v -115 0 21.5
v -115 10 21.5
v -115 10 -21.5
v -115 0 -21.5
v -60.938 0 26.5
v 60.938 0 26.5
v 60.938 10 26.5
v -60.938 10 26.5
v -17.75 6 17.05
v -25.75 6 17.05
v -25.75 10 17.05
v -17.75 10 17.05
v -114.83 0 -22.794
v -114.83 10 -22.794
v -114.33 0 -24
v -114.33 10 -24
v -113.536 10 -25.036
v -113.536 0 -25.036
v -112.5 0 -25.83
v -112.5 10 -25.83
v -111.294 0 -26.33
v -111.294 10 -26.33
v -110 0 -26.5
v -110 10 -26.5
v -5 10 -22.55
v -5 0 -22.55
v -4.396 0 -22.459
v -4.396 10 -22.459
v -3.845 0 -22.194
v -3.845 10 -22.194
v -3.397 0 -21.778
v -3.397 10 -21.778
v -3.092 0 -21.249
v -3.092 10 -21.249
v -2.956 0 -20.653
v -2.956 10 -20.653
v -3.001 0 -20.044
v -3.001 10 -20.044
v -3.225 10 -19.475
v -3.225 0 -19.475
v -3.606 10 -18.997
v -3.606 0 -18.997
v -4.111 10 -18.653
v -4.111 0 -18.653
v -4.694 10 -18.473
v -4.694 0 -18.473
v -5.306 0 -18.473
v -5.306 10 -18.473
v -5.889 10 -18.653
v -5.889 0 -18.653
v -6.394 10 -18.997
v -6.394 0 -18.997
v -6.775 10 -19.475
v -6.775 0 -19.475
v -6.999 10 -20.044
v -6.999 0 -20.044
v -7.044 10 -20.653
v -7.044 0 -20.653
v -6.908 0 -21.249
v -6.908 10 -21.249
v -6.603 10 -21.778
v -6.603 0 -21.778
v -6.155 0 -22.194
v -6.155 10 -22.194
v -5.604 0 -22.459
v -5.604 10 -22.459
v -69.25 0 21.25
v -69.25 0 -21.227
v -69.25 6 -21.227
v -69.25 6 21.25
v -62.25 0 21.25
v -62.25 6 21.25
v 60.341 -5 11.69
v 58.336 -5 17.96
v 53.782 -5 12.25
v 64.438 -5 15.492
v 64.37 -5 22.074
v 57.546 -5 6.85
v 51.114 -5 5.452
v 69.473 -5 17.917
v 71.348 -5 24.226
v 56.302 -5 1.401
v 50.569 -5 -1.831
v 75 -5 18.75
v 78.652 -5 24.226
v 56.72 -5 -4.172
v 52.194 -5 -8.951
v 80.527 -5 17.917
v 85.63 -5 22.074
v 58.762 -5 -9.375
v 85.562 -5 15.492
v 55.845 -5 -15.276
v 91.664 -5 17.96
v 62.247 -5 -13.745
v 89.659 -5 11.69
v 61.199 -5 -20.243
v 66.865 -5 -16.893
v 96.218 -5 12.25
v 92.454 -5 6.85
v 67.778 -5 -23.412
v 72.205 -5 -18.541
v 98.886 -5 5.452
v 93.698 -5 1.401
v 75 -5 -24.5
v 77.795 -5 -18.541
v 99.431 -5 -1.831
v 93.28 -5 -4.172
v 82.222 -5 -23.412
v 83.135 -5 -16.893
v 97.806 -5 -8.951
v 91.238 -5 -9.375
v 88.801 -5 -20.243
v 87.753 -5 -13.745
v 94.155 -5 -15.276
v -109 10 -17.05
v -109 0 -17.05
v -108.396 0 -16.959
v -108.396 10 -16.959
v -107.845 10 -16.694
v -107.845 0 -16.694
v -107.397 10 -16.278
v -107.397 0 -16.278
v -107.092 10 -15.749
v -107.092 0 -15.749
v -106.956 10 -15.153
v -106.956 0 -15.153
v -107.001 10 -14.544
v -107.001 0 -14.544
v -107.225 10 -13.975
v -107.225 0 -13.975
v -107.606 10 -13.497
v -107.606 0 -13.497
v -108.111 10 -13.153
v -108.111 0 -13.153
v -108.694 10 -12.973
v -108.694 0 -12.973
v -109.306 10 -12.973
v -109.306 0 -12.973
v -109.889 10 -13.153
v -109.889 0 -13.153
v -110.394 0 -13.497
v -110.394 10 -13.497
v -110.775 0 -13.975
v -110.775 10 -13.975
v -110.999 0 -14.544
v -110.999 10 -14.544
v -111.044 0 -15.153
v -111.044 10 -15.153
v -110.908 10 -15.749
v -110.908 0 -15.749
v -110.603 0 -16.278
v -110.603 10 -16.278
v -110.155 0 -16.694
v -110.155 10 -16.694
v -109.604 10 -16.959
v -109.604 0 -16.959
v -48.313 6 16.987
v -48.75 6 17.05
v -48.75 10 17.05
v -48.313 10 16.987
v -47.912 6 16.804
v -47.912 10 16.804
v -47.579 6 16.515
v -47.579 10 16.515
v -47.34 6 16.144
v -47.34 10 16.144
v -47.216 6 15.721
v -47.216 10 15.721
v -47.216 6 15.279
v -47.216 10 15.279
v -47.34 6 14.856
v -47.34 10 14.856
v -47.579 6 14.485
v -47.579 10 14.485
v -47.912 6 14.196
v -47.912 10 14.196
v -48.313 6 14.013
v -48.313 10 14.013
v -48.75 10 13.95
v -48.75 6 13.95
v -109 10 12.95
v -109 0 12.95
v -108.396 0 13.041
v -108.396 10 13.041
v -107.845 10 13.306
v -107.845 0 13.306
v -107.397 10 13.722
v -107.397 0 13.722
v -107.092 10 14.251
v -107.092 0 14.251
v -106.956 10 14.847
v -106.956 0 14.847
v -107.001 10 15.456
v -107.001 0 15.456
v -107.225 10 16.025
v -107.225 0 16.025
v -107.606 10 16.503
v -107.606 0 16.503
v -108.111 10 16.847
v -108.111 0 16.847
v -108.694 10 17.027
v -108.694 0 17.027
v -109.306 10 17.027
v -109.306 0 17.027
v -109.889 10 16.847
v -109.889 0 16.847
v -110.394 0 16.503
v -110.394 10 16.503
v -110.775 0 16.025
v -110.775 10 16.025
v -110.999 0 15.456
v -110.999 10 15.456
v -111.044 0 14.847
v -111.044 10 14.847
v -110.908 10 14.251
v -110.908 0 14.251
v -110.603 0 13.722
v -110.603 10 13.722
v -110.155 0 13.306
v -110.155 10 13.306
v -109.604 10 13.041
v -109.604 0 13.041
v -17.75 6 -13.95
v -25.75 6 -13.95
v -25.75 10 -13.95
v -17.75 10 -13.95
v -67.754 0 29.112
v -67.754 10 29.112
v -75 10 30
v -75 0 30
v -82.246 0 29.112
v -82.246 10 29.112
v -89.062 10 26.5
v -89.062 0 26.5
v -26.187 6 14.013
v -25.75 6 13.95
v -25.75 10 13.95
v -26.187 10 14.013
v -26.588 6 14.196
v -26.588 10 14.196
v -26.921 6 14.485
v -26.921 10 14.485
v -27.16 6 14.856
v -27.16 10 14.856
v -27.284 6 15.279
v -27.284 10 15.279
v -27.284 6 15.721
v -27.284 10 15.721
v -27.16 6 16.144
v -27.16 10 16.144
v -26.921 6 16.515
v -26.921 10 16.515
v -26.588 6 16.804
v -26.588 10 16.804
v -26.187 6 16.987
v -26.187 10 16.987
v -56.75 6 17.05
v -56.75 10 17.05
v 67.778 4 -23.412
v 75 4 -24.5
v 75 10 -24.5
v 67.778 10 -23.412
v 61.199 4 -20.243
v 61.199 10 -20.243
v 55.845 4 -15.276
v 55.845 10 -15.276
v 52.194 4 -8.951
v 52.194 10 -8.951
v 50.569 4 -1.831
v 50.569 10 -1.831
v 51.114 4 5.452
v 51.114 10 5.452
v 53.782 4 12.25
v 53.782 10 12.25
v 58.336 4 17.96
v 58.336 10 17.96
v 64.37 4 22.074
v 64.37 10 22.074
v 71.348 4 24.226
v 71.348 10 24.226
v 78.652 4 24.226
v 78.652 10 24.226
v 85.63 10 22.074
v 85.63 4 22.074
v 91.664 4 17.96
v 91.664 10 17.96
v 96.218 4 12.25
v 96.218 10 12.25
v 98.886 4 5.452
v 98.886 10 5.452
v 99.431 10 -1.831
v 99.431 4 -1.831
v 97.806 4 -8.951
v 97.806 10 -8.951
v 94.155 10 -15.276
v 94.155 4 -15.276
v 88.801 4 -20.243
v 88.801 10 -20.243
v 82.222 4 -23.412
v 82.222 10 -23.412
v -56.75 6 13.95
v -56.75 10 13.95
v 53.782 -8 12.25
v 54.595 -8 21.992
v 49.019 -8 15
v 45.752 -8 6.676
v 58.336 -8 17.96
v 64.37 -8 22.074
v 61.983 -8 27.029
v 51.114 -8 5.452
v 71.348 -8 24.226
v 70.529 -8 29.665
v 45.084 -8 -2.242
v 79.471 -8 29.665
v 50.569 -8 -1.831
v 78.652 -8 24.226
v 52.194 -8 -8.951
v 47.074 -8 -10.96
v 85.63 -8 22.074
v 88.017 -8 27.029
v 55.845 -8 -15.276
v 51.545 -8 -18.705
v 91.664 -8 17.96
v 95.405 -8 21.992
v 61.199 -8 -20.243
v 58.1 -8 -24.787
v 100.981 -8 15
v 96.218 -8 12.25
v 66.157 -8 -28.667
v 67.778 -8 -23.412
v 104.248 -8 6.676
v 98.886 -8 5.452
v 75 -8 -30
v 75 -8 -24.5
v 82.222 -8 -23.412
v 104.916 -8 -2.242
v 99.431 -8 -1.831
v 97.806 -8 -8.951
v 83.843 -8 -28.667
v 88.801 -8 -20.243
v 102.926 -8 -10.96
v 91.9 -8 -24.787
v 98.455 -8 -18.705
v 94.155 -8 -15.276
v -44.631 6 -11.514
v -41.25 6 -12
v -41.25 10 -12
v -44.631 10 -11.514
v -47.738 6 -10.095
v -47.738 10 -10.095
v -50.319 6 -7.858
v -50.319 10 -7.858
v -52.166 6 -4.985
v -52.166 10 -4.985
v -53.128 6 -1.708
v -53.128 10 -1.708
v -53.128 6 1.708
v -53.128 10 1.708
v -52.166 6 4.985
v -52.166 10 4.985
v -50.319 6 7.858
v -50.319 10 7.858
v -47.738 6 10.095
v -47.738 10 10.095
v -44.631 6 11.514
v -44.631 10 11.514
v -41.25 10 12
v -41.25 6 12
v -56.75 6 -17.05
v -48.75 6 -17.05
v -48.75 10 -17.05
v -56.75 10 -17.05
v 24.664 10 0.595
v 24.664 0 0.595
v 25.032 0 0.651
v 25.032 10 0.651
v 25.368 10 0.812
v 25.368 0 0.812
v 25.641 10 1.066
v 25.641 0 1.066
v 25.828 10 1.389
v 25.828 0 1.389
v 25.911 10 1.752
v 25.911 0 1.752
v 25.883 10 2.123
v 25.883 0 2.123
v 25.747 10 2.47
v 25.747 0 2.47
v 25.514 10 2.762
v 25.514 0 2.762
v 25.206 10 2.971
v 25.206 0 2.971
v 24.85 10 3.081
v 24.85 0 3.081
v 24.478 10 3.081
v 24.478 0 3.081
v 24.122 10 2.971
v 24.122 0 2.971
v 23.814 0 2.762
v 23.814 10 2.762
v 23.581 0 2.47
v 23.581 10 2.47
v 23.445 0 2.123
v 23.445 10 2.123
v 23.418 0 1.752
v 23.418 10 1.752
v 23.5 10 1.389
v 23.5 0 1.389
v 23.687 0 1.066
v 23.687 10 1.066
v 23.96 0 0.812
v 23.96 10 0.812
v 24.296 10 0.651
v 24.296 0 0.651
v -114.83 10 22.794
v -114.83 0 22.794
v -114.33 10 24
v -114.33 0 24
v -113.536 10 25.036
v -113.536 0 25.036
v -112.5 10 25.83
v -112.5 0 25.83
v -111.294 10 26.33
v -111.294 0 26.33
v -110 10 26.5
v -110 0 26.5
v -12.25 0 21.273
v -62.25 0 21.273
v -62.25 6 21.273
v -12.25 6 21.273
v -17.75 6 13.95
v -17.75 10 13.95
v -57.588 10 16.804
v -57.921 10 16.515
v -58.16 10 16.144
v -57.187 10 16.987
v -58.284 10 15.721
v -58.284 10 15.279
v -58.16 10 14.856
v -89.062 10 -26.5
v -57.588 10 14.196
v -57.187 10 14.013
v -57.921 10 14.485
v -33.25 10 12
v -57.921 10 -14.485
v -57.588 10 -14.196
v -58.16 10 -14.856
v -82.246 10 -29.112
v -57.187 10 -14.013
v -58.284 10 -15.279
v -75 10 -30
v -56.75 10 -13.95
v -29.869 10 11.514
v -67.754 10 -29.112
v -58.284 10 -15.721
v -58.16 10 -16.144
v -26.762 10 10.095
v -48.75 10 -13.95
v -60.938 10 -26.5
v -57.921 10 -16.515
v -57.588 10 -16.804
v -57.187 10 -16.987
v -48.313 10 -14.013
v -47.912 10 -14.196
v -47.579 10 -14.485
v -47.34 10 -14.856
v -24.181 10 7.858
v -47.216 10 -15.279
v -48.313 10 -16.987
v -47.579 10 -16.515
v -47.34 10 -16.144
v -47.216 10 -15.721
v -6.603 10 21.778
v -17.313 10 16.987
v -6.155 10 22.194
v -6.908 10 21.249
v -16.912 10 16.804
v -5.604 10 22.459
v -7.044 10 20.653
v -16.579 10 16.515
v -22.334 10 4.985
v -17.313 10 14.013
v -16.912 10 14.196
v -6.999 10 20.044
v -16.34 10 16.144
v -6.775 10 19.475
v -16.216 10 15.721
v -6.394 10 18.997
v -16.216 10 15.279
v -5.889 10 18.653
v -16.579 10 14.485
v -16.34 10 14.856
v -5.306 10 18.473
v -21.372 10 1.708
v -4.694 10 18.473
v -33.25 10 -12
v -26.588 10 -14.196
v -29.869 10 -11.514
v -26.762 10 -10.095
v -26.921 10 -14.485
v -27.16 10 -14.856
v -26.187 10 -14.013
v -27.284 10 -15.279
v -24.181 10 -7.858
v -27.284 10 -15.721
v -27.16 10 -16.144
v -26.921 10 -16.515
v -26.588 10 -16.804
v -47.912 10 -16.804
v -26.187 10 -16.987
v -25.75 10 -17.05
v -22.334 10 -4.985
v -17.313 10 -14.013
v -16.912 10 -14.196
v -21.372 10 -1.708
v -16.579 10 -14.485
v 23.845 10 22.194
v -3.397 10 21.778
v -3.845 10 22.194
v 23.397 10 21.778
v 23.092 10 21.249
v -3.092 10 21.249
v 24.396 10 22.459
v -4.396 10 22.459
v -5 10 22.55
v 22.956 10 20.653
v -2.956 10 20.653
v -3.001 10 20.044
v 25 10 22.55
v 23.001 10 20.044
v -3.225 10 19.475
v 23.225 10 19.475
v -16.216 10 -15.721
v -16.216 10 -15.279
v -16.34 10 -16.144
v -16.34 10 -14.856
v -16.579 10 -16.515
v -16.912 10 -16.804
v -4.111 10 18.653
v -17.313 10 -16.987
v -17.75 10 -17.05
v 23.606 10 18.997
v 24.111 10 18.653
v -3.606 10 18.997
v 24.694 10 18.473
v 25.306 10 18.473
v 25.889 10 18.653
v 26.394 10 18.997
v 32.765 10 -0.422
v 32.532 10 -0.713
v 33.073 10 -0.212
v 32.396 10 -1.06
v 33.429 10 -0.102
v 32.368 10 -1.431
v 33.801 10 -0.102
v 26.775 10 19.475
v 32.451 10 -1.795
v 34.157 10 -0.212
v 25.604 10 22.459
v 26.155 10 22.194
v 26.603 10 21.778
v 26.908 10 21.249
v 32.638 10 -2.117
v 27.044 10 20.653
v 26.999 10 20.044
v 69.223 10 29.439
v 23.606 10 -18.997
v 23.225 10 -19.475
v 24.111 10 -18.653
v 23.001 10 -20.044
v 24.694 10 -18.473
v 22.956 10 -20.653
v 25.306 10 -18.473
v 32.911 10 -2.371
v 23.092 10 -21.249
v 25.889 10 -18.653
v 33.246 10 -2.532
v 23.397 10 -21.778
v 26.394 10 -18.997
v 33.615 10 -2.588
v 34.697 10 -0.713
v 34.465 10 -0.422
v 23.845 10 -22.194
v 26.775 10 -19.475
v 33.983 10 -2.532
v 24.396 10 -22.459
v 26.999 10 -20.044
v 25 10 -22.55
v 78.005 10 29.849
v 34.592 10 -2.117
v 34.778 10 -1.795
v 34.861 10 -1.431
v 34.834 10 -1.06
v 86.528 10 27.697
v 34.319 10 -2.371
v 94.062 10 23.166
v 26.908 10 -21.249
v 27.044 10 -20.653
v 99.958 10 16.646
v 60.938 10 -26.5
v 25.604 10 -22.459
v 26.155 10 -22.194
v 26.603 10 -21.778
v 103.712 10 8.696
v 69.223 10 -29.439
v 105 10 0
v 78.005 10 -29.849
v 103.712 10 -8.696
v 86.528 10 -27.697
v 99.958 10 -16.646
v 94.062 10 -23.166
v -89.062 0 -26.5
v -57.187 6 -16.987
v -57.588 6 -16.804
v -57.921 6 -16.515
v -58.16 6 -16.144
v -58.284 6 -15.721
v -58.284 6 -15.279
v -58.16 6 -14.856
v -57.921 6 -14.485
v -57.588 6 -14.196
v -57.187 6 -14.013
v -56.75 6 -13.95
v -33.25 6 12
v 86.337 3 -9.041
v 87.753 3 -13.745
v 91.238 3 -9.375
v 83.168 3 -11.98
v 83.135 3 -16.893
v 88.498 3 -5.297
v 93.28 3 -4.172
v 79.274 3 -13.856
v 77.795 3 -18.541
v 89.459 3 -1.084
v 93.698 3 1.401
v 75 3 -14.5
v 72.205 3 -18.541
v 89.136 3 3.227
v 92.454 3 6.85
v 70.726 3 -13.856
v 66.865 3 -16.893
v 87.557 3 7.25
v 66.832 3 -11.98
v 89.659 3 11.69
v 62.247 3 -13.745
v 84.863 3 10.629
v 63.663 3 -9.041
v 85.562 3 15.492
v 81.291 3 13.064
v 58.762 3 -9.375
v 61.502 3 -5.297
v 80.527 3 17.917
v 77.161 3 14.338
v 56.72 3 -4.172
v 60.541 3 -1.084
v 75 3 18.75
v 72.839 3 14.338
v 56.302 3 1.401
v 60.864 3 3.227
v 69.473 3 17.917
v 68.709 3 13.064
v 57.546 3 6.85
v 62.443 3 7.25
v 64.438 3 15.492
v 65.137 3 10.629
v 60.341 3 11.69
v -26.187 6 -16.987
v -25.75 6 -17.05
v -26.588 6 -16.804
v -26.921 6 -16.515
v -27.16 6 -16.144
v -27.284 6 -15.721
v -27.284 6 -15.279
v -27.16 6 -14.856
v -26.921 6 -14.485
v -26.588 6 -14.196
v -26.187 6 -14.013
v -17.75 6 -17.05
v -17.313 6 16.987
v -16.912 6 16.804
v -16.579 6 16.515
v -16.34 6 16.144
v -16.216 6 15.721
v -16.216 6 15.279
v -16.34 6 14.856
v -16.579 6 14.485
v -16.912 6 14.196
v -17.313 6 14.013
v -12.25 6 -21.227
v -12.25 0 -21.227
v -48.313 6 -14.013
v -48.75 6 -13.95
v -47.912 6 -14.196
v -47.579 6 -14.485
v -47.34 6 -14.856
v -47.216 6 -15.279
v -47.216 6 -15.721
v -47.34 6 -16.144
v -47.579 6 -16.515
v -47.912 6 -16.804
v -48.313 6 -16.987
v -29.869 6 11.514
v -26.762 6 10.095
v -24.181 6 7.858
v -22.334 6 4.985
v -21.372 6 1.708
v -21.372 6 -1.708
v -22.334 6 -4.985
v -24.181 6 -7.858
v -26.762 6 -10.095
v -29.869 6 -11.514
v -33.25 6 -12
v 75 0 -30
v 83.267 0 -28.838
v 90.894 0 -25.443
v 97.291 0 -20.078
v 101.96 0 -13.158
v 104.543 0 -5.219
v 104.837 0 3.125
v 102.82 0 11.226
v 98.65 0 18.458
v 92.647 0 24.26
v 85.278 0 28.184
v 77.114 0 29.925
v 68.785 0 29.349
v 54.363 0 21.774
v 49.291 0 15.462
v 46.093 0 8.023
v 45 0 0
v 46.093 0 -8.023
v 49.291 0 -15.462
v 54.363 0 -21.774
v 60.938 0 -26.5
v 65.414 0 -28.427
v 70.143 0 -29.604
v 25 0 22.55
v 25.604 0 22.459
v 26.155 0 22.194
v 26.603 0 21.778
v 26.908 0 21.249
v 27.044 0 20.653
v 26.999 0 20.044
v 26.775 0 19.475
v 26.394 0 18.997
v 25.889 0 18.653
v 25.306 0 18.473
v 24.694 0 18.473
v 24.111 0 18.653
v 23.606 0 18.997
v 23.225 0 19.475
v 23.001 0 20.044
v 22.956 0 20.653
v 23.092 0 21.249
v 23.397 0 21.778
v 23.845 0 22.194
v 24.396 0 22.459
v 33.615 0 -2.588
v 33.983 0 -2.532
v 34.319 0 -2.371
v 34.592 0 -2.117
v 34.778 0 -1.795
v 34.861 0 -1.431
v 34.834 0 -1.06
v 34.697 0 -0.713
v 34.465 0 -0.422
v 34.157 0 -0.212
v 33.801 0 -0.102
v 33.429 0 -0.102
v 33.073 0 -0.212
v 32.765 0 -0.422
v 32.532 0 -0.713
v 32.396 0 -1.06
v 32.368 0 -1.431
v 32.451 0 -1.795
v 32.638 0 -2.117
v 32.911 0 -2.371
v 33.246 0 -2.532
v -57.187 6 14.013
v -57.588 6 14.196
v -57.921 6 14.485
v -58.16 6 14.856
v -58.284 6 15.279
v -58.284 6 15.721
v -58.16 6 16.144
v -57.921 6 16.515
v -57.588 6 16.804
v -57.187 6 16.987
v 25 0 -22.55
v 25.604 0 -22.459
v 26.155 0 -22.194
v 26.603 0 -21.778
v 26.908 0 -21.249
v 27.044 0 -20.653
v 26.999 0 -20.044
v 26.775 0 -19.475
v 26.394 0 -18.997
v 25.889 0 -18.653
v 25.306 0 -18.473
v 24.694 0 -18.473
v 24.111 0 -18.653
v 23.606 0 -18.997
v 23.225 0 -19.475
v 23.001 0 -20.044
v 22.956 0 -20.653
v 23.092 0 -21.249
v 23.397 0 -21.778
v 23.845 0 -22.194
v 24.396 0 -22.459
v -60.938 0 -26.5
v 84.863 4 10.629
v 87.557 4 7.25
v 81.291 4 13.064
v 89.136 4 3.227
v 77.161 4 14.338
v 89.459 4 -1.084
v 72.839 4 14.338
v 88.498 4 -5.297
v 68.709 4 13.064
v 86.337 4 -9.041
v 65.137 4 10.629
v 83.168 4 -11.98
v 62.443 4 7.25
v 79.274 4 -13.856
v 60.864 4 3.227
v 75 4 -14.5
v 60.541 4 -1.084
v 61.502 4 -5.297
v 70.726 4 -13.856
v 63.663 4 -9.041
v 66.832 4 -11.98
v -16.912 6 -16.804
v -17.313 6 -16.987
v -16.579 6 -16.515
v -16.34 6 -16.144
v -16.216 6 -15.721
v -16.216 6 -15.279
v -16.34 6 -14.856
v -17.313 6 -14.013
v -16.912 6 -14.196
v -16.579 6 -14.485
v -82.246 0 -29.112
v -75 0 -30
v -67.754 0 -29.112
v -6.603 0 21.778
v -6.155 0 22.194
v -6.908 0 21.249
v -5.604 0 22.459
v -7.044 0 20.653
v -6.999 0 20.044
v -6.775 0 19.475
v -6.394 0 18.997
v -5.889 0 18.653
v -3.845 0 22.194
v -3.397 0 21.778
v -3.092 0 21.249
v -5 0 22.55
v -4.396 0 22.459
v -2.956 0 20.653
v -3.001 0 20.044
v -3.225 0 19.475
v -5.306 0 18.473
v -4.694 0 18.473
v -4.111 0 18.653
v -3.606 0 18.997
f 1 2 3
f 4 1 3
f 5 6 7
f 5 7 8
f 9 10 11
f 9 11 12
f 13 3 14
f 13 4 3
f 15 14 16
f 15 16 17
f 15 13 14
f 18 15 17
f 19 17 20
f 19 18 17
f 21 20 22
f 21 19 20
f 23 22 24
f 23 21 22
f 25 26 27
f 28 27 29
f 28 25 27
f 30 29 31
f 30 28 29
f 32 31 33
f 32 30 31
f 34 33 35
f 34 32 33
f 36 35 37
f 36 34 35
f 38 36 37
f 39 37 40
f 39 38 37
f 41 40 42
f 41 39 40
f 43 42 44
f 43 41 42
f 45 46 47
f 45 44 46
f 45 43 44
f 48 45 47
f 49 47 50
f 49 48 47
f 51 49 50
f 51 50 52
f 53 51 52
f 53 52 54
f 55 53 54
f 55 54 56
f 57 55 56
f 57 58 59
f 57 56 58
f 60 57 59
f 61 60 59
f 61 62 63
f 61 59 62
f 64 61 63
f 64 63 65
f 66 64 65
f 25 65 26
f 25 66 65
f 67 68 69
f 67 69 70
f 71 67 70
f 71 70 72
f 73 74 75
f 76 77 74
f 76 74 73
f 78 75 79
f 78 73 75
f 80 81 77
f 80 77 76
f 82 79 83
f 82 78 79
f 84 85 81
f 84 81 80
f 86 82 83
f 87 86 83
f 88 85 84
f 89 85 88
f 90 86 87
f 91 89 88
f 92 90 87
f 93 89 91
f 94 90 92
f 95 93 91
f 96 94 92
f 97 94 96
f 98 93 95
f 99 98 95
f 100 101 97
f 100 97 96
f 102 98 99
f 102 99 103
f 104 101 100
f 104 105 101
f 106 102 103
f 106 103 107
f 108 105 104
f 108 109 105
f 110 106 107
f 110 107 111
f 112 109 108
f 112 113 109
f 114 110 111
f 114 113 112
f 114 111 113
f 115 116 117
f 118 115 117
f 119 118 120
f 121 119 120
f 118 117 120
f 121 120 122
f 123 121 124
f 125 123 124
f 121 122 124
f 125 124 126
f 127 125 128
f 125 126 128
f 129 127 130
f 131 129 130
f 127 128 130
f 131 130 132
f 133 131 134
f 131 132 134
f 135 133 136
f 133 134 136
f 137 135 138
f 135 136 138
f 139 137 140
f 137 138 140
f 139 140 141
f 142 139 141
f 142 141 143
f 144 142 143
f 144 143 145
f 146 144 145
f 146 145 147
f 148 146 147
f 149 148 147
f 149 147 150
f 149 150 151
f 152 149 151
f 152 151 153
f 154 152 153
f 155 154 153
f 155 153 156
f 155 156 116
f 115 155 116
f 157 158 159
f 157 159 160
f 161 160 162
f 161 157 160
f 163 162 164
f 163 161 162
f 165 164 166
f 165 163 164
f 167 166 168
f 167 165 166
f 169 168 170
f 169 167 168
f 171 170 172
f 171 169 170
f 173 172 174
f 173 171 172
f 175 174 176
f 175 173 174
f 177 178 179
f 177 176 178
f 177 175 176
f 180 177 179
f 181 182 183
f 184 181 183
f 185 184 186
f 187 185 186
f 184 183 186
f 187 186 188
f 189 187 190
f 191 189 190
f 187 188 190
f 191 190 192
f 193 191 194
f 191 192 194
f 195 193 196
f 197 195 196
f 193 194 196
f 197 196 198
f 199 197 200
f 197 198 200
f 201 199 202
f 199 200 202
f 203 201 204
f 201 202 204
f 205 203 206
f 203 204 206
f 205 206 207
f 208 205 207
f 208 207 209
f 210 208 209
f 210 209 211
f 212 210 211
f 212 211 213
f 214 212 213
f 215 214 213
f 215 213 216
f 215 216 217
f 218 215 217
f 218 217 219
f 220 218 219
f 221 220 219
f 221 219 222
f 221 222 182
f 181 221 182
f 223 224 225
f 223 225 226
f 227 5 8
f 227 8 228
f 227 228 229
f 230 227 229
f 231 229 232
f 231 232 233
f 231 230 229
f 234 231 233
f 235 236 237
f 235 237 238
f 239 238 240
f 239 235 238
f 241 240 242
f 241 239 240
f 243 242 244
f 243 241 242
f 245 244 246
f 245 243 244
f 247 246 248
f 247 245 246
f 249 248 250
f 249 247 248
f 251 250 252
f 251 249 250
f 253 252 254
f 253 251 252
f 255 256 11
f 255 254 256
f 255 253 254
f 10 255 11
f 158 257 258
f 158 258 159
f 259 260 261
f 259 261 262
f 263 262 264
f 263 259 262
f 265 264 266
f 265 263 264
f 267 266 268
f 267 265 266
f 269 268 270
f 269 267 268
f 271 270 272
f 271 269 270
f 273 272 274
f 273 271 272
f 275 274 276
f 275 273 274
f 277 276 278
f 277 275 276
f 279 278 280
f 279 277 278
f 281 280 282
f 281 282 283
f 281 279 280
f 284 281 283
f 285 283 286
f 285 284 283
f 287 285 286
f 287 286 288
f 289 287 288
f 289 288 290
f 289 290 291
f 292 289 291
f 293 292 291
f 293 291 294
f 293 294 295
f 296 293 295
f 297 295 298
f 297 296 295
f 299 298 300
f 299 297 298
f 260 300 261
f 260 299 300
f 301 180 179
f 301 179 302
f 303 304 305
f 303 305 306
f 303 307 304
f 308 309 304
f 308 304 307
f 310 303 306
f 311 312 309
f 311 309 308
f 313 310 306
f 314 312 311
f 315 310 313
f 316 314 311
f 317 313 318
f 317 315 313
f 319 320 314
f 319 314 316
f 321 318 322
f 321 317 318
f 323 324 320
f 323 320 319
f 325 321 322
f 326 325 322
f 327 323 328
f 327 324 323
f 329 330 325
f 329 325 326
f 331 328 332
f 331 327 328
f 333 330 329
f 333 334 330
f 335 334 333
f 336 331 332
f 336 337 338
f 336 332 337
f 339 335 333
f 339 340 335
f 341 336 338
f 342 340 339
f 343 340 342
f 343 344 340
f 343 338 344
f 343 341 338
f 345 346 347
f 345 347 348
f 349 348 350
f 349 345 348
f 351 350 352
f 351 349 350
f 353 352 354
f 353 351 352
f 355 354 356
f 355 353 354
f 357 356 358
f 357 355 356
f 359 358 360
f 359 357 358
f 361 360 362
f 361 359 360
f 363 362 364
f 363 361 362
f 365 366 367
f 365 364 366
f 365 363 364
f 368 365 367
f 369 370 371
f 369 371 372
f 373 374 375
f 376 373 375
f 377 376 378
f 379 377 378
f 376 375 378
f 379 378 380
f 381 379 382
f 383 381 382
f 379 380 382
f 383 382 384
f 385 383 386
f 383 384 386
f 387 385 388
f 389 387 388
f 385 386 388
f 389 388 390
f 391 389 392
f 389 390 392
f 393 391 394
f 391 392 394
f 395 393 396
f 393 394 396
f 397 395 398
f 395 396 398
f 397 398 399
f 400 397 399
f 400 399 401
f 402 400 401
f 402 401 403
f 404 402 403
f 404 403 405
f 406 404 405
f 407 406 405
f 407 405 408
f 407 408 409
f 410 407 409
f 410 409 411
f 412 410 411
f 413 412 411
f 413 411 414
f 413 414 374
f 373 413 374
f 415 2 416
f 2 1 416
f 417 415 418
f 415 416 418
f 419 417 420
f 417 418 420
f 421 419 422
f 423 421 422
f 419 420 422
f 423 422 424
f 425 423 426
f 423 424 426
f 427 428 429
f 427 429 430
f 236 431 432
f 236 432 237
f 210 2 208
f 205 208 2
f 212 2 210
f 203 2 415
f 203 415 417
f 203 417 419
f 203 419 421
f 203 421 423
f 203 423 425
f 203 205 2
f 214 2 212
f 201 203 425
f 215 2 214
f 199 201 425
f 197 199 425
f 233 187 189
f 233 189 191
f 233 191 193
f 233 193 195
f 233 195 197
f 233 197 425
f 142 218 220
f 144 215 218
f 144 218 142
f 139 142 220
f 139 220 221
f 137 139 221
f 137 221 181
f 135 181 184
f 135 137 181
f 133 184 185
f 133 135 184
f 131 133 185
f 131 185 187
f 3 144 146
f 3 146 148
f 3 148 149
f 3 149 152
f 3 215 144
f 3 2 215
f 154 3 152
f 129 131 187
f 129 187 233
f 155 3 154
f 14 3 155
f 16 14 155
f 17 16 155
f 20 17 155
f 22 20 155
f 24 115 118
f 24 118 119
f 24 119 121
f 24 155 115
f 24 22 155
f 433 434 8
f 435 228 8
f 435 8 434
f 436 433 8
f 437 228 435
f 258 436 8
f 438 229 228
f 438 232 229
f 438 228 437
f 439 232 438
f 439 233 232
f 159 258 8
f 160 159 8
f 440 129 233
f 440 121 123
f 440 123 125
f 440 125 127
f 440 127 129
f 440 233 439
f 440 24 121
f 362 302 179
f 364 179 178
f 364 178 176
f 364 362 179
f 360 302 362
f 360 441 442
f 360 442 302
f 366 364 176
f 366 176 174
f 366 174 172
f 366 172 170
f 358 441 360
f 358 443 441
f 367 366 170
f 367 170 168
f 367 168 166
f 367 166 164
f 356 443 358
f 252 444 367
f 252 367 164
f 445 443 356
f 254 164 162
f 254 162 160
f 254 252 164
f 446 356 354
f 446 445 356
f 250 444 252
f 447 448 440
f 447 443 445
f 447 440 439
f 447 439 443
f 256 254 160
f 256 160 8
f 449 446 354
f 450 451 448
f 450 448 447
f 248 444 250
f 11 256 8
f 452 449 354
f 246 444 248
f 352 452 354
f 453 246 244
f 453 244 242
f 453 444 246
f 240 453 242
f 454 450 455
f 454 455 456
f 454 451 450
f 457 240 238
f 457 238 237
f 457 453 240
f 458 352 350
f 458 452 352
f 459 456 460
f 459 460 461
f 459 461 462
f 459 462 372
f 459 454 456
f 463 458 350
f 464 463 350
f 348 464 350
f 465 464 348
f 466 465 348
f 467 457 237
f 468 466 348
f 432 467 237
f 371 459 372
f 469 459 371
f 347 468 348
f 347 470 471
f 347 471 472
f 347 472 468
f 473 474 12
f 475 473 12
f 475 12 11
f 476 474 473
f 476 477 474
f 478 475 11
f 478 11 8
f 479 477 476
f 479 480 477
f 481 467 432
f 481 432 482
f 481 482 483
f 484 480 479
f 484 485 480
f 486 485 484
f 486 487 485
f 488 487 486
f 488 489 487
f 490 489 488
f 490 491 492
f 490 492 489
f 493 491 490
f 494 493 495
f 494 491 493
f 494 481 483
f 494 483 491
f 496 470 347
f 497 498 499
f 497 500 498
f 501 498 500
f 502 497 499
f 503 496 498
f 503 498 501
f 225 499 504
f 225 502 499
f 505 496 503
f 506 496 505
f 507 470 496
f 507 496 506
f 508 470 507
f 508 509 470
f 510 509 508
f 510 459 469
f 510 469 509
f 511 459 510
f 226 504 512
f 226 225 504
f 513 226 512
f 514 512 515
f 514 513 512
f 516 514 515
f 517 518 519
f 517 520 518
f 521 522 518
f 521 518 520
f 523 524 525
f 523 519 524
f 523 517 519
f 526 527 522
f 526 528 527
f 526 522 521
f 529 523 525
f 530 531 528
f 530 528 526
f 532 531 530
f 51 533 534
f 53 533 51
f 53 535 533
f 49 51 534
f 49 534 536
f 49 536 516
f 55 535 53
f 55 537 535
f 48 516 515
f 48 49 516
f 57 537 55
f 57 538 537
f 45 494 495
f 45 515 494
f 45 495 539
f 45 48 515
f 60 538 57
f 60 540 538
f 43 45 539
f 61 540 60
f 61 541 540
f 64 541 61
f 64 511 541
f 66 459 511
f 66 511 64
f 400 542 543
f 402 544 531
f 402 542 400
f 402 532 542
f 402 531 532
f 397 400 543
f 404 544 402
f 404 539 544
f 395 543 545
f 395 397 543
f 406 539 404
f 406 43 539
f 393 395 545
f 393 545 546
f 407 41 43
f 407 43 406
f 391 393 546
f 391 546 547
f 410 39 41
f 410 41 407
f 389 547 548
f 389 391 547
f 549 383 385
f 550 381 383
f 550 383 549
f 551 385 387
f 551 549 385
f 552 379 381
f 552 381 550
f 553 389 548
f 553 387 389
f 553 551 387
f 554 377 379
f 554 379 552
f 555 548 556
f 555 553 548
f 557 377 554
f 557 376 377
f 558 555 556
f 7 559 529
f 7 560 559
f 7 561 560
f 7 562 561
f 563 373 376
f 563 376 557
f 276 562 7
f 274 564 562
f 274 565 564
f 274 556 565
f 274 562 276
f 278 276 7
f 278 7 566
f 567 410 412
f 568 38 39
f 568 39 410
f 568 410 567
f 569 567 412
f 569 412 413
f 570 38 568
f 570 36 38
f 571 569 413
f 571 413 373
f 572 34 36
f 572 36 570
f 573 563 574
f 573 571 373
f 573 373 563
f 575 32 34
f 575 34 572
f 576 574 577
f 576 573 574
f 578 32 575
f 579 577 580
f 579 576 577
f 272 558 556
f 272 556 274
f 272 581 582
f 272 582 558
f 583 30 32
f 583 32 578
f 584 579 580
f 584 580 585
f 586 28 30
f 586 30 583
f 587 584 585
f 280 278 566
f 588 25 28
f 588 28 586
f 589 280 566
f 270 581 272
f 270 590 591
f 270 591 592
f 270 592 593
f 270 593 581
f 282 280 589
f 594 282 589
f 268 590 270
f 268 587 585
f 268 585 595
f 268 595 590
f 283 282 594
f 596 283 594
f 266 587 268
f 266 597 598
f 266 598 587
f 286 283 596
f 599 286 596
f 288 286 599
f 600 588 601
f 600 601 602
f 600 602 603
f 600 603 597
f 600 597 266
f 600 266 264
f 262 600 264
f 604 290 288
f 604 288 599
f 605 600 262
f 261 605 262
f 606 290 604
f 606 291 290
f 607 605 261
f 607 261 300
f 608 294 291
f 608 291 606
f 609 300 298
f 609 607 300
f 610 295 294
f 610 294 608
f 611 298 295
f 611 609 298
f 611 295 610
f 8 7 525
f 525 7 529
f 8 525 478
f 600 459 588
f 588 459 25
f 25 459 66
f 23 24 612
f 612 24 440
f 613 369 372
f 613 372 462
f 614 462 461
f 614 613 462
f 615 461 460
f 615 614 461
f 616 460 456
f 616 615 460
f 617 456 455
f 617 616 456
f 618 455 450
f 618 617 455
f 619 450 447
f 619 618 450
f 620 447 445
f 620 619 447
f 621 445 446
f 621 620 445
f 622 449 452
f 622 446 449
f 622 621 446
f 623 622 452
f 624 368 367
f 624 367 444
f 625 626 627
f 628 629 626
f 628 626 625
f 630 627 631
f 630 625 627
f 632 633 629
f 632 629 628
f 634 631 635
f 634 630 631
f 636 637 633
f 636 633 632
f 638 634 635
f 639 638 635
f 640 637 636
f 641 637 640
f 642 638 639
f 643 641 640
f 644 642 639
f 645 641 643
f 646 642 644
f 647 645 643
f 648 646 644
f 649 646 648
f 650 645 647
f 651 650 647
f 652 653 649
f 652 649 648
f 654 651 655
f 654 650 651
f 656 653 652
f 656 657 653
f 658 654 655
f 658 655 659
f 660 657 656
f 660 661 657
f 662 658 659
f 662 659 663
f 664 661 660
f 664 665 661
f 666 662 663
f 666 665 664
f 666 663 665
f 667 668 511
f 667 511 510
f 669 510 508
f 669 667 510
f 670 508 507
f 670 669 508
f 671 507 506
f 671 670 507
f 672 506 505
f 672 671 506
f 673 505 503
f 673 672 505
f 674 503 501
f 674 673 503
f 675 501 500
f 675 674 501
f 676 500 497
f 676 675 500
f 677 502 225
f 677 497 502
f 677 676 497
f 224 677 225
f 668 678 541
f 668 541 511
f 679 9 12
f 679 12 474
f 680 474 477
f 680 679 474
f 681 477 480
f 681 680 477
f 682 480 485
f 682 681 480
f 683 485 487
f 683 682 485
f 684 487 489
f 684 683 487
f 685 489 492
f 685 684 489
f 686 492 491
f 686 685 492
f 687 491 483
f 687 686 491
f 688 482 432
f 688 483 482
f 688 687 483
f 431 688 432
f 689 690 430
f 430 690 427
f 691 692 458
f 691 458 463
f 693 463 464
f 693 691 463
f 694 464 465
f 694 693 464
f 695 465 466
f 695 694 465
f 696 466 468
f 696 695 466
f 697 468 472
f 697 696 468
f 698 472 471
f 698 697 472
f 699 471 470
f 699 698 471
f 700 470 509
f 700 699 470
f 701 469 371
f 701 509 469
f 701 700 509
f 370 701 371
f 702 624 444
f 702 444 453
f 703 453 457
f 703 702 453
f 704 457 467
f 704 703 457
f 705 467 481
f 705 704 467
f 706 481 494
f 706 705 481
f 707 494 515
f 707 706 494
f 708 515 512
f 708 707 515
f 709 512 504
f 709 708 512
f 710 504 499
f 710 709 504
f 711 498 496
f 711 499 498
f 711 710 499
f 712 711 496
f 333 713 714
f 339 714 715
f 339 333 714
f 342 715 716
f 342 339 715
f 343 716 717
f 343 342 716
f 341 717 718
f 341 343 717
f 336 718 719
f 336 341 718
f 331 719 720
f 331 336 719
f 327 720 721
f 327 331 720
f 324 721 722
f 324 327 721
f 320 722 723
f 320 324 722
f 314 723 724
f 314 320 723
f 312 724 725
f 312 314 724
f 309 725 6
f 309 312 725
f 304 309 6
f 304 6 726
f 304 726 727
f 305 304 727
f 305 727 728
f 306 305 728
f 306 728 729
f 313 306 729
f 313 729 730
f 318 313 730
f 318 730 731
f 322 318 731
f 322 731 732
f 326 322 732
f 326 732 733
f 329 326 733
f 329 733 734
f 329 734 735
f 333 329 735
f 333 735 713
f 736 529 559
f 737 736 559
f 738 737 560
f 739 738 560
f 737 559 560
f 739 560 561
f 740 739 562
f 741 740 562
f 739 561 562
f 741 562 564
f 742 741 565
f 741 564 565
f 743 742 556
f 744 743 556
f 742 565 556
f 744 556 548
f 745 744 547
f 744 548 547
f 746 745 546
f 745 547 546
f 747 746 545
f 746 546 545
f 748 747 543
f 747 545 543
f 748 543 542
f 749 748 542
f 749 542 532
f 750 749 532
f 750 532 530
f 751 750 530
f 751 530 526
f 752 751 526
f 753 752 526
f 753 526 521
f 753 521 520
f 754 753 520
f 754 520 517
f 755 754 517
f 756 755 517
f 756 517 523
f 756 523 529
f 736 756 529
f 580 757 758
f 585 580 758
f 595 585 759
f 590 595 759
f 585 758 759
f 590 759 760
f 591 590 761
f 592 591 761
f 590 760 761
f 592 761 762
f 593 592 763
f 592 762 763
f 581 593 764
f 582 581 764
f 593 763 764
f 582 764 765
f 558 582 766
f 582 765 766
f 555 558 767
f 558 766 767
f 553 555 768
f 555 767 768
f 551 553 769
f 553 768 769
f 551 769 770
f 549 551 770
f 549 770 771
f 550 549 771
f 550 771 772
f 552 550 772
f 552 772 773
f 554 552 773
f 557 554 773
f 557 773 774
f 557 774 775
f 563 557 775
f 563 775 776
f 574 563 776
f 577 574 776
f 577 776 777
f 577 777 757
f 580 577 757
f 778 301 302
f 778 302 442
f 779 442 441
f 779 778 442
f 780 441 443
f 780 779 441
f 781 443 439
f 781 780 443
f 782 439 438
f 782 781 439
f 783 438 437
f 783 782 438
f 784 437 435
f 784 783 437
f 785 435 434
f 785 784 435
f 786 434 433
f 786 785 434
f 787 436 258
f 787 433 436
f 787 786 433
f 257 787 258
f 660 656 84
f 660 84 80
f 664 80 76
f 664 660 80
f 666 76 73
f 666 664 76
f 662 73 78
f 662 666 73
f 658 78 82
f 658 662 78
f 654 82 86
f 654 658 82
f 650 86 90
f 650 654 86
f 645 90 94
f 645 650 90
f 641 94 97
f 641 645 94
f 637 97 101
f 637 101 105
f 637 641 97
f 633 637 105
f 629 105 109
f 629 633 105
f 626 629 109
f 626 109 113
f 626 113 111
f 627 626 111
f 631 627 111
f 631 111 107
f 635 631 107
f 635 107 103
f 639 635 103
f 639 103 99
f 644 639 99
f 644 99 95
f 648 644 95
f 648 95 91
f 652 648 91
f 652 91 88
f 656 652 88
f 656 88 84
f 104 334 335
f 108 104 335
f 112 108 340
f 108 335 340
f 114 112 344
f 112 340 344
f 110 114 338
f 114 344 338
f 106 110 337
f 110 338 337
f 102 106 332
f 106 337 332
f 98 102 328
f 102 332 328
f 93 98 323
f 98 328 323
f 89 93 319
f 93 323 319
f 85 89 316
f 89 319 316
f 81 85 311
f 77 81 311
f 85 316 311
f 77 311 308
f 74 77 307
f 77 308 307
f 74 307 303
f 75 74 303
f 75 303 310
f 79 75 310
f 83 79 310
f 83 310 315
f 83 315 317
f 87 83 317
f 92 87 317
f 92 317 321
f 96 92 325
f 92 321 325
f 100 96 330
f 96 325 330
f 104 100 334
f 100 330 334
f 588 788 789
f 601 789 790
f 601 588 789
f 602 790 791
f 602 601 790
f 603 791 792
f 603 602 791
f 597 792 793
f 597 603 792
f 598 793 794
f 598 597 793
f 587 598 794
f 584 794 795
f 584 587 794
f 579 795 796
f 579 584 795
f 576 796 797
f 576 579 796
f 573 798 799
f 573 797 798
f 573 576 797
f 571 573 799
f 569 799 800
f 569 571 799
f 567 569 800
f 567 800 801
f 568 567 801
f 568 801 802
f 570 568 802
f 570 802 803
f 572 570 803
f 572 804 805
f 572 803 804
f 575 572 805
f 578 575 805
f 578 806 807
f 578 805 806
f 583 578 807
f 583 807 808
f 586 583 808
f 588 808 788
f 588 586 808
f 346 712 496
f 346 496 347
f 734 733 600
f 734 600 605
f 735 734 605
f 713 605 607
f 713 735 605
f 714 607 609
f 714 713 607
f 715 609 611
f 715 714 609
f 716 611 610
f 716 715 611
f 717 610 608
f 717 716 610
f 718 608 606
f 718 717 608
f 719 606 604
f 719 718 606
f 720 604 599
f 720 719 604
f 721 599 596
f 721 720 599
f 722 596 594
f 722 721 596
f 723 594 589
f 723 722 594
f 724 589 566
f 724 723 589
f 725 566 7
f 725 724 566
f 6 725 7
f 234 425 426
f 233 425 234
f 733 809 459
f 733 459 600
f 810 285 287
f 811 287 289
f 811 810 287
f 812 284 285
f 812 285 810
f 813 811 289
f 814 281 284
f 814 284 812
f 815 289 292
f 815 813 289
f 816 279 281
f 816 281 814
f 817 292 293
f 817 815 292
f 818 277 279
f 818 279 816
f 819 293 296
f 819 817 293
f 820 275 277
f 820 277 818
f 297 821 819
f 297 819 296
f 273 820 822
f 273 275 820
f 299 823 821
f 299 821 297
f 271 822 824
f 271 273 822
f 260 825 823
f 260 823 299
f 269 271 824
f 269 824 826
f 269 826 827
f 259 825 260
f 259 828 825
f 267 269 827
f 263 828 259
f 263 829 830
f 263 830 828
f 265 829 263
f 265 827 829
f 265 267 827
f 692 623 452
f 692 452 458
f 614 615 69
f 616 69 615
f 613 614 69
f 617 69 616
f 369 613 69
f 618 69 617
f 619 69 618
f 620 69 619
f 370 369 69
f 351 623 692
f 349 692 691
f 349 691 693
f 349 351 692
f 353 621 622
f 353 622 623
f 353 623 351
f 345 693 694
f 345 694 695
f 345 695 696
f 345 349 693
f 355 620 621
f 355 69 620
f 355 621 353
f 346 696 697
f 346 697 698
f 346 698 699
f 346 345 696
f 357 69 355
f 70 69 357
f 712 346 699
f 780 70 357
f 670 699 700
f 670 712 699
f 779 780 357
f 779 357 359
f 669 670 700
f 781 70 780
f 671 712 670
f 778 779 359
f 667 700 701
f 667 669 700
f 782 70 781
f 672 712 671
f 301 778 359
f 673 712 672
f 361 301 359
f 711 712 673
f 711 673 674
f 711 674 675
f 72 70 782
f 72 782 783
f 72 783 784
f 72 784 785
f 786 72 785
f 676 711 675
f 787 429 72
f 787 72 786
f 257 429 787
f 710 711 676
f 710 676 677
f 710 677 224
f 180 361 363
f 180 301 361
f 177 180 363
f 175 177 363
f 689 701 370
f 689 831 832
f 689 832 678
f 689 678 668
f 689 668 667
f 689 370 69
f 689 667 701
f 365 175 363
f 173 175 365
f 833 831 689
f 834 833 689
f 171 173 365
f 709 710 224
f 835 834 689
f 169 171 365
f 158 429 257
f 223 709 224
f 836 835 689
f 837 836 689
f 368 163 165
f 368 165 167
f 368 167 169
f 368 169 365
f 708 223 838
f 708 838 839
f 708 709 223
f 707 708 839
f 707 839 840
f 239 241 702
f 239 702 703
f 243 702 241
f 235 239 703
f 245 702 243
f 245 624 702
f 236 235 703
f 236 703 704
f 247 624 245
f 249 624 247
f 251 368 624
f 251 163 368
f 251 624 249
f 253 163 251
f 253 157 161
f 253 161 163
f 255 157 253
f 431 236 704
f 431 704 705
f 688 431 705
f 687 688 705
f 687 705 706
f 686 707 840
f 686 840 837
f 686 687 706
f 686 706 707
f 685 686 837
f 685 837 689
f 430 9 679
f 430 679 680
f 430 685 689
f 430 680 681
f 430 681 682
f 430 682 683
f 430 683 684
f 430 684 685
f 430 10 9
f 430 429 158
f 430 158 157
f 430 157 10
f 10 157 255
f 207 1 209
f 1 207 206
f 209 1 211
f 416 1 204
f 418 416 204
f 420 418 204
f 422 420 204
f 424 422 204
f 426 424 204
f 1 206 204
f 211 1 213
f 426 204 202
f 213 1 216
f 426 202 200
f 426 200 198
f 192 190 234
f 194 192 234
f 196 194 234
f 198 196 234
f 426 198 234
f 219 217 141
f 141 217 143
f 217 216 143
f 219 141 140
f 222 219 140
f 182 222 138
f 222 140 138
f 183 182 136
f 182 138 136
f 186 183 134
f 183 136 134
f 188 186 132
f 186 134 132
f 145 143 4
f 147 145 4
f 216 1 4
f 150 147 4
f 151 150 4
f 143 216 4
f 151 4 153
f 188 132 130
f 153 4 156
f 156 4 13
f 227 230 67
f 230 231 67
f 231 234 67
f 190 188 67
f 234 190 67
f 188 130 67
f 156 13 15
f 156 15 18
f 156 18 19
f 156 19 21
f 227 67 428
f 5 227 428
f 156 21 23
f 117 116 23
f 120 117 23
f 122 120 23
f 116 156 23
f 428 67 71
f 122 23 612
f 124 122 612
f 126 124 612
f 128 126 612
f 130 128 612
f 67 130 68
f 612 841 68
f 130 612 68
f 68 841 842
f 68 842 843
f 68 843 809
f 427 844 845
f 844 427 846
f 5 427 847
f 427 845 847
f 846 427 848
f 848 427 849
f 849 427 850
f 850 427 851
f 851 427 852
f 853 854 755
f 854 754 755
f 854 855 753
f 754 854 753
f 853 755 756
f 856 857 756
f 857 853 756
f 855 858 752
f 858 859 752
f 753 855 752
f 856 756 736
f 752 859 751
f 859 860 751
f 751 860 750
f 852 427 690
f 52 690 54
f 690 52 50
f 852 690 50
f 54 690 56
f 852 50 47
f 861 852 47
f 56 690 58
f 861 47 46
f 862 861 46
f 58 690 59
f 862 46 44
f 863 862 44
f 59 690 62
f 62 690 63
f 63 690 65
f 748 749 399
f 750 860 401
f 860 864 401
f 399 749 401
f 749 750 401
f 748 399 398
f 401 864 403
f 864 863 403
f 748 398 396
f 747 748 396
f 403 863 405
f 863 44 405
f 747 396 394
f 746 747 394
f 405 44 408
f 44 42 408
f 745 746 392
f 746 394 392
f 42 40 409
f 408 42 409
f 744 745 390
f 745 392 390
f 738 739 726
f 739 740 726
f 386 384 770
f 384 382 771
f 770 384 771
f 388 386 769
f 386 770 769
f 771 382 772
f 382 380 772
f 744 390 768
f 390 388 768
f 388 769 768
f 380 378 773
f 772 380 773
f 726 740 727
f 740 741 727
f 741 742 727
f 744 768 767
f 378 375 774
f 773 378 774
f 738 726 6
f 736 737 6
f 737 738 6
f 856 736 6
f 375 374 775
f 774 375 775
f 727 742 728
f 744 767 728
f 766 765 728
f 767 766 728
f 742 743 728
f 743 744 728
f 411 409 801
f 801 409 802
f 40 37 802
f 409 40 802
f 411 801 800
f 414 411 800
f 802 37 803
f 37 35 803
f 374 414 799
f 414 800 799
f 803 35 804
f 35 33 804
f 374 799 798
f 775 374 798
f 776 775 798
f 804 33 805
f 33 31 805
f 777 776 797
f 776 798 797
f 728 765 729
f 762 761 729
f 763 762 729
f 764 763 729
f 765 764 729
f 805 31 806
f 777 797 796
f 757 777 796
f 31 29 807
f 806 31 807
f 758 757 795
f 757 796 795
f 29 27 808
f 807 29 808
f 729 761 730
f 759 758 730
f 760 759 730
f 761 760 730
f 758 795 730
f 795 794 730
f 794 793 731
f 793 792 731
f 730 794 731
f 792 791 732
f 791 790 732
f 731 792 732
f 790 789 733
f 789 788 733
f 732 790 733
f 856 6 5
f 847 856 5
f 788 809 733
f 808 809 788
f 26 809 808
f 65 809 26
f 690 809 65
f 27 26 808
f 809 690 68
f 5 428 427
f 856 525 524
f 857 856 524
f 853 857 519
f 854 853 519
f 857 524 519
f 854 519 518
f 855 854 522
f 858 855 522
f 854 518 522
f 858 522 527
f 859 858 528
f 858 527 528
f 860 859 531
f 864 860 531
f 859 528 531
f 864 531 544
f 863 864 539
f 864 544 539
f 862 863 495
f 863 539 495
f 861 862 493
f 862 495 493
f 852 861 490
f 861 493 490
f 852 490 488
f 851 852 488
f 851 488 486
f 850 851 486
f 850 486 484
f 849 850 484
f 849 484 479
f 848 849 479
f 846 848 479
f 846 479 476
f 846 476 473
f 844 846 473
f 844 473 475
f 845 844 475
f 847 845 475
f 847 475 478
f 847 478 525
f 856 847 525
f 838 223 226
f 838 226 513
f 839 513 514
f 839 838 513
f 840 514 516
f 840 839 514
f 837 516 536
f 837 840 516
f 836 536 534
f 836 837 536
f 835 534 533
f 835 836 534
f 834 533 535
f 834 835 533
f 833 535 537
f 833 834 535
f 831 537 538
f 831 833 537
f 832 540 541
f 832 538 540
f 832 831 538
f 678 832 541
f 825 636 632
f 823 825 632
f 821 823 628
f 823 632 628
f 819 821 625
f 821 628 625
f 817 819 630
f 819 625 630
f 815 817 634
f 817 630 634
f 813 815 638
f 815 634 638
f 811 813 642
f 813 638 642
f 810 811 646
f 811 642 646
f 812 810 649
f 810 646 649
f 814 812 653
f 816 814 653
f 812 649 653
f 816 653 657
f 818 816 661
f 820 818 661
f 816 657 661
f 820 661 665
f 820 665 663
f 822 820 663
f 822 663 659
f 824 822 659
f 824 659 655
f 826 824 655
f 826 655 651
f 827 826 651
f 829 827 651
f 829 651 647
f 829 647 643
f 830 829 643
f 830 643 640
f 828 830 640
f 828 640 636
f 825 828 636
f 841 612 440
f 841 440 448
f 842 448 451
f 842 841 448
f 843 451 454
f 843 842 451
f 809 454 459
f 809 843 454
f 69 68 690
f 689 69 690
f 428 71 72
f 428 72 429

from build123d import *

# Parameters (mm, degrees)
BOSS_EXTRUDE1_DEPTH     = 10
SKETCH2_W               = 50
SKETCH2_H               = 42.5
CUT_EXTRUDE1_DEPTH      = 6
CUT_EXTRUDE7_REACH      = 111.659
SKETCH10_R              = 14.5
CUT_EXTRUDE8_DEPTH      = 110.658560997
CUT_EXTRUDE8_DEPTH_BACK = 3
SKETCH11_R              = 18.75
BOSS_EXTRUDE3_START     = 8
SKETCH12_R              = 30
BOSS_EXTRUDE3_DEPTH     = 8
SKETCH13_R              = 24.5
CUT_EXTRUDE9_DEPTH      = 3
SKETCH14_R              = 18.75
CUT_EXTRUDE10_DEPTH     = 7
CUT_EXTRUDE11_START     = -6
SKETCH15_R              = 24.5
CUT_EXTRUDE11_DEPTH     = 6
CUT_EXTRUDE19_REACH     = 112.095
SKETCH26_W              = 40
SKETCH26_H              = 53
BOSS_EXTRUDE5_DEPTH     = 10
SKETCH19_W              = 46.483409888
SKETCH19_H              = 53
BOSS_EXTRUDE4_DEPTH     = 10
SKETCH23_W              = 7
SKETCH23_H              = 42.47741106
CUT_EXTRUDE18_DEPTH     = 6
FILLET3_R               = 5
SKETCH27_R              = 2.05
SKETCH27_R_2            = 4.962590862
CUT_EXTRUDE20_DEPTH     = 20
CUT_EXTRUDE22_REACH     = 121.269
SKETCH29_R              = 2.05
CUT_EXTRUDE23_REACH     = 121.269
SKETCH30_R              = 1.25


with BuildPart() as part:
    # Sketch1 → Boss-Extrude1 (new body)
    with BuildSketch(Plane(origin=(0, 0, 0), x_dir=(1, 0, 0), z_dir=(0, 1, 0))):
        with BuildLine():
            Line((-52.13627327, 26.5), (60.93763889, 26.5))
            ThreePointArc((60.93763889, 26.5), (105, 0), (60.93763889, -26.5))
            Line((60.93763889, -26.5), (-52.13627327, -26.5))
            Line((-52.13627327, -26.5), (-60.93763889, -26.5))
            ThreePointArc((-60.93763889, -26.5), (-105, 0), (-60.93763889, 26.5))
            Line((-60.93763889, 26.5), (-52.13627327, 26.5))
        make_face()
    extrude(amount=BOSS_EXTRUDE1_DEPTH)

    # Sketch2 → Cut-Extrude1 (cut)
    with BuildSketch(Plane.XZ):
        with Locations((-37.25, 0.02258894)):
            Rectangle(SKETCH2_W, SKETCH2_H)
    extrude(amount=-CUT_EXTRUDE1_DEPTH, mode=Mode.SUBTRACT)

    # Sketch10 → Cut-Extrude7 (cut, up to next)
    with BuildSketch(Plane.XZ, mode=Mode.PRIVATE) as cut_extrude7_sk1:
        with Locations((75, 0)):
            Circle(SKETCH10_R)
    cut_extrude7_tool1 = extrude(cut_extrude7_sk1.sketch, amount=-CUT_EXTRUDE7_REACH, mode=Mode.PRIVATE) & part.part
    add(cut_extrude7_tool1.solids().sort_by_distance((75, 0, 0))[0], mode=Mode.SUBTRACT)

    # Sketch11 → Cut-Extrude8 (cut, two sides: drawn at the far end of the back side and taken through both)
    with BuildSketch(Plane.XZ.offset(-CUT_EXTRUDE8_DEPTH_BACK)):
        with Locations((75, 0)):
            Circle(SKETCH11_R)
    extrude(amount=CUT_EXTRUDE8_DEPTH + CUT_EXTRUDE8_DEPTH_BACK, mode=Mode.SUBTRACT)

    # Sketch12 → Boss-Extrude3 (add)
    with BuildSketch(Plane.XZ.offset(BOSS_EXTRUDE3_START)):
        with Locations((75, 0)):
            Circle(SKETCH12_R)
    extrude(amount=-BOSS_EXTRUDE3_DEPTH)

    # Sketch13 → Cut-Extrude9 (cut)
    with BuildSketch(Plane.XZ.offset(8)):
        with Locations((75, 0)):
            Circle(SKETCH13_R)
    extrude(amount=-CUT_EXTRUDE9_DEPTH, mode=Mode.SUBTRACT)

    # Sketch14 → Cut-Extrude10 (cut)
    with BuildSketch(Plane.XZ.offset(5)):
        with Locations((75, 0)):
            Circle(SKETCH14_R)
    extrude(amount=-CUT_EXTRUDE10_DEPTH, mode=Mode.SUBTRACT)

    # Sketch15 → Cut-Extrude11 (cut)
    with BuildSketch(Plane(origin=(0, 10, 0), x_dir=(1, 0, 0), z_dir=(0, 1, 0)).offset(CUT_EXTRUDE11_START)):
        with Locations((75, 0)):
            Circle(SKETCH15_R)
    extrude(amount=CUT_EXTRUDE11_DEPTH, mode=Mode.SUBTRACT)

    # Sketch25 → Cut-Extrude19 (cut, up to next)
    with BuildSketch(Plane.XZ.offset(-6), mode=Mode.PRIVATE) as cut_extrude19_sk1:
        with BuildLine():
            Line((-33.25, -12), (-41.25, -12))
            ThreePointArc((-41.25, -12), (-53.25, 0), (-41.25, 12))
            Line((-41.25, 12), (-33.25, 12))
            ThreePointArc((-33.25, 12), (-21.25, 0), (-33.25, -12))
        make_face()
    cut_extrude19_tool1 = extrude(cut_extrude19_sk1.sketch, amount=-CUT_EXTRUDE19_REACH, mode=Mode.PRIVATE) & part.part
    # Sketch25 → Cut-Extrude19 (cut, up to next)
    with BuildSketch(Plane.XZ.offset(-6), mode=Mode.PRIVATE) as cut_extrude19_sk2:
        with BuildLine():
            Line((-17.75, -17.05), (-25.75, -17.05))
            ThreePointArc((-25.75, -17.05), (-27.3, -15.5), (-25.75, -13.95))
            Line((-25.75, -13.95), (-17.75, -13.95))
            ThreePointArc((-17.75, -13.95), (-16.2, -15.5), (-17.75, -17.05))
        make_face()
    cut_extrude19_tool2 = extrude(cut_extrude19_sk2.sketch, amount=-CUT_EXTRUDE19_REACH, mode=Mode.PRIVATE) & part.part
    # Sketch25 → Cut-Extrude19 (cut, up to next)
    with BuildSketch(Plane.XZ.offset(-6), mode=Mode.PRIVATE) as cut_extrude19_sk3:
        with BuildLine():
            Line((-48.75, -17.05), (-56.75, -17.05))
            ThreePointArc((-56.75, -17.05), (-58.3, -15.5), (-56.75, -13.95))
            Line((-56.75, -13.95), (-48.75, -13.95))
            ThreePointArc((-48.75, -13.95), (-47.2, -15.5), (-48.75, -17.05))
        make_face()
    cut_extrude19_tool3 = extrude(cut_extrude19_sk3.sketch, amount=-CUT_EXTRUDE19_REACH, mode=Mode.PRIVATE) & part.part
    # Sketch25 → Cut-Extrude19 (cut, up to next)
    with BuildSketch(Plane.XZ.offset(-6), mode=Mode.PRIVATE) as cut_extrude19_sk4:
        with BuildLine():
            Line((-48.75, 13.95), (-56.75, 13.95))
            ThreePointArc((-56.75, 13.95), (-58.3, 15.5), (-56.75, 17.05))
            Line((-56.75, 17.05), (-48.75, 17.05))
            ThreePointArc((-48.75, 17.05), (-47.2, 15.5), (-48.75, 13.95))
        make_face()
    cut_extrude19_tool4 = extrude(cut_extrude19_sk4.sketch, amount=-CUT_EXTRUDE19_REACH, mode=Mode.PRIVATE) & part.part
    # Sketch25 → Cut-Extrude19 (cut, up to next)
    with BuildSketch(Plane.XZ.offset(-6), mode=Mode.PRIVATE) as cut_extrude19_sk5:
        with BuildLine():
            Line((-17.75, 13.95), (-25.75, 13.95))
            ThreePointArc((-25.75, 13.95), (-27.3, 15.5), (-25.75, 17.05))
            Line((-25.75, 17.05), (-17.75, 17.05))
            ThreePointArc((-17.75, 17.05), (-16.2, 15.5), (-17.75, 13.95))
        make_face()
    cut_extrude19_tool5 = extrude(cut_extrude19_sk5.sketch, amount=-CUT_EXTRUDE19_REACH, mode=Mode.PRIVATE) & part.part
    add(cut_extrude19_tool1.solids().sort_by_distance((-37.25, 6, 0))[0], mode=Mode.SUBTRACT)
    add(cut_extrude19_tool2.solids().sort_by_distance((-21.75, 6, -15.5))[0], mode=Mode.SUBTRACT)
    add(cut_extrude19_tool3.solids().sort_by_distance((-52.75, 6, -15.5))[0], mode=Mode.SUBTRACT)
    add(cut_extrude19_tool4.solids().sort_by_distance((-52.75, 6, 15.5))[0], mode=Mode.SUBTRACT)
    add(cut_extrude19_tool5.solids().sort_by_distance((-21.75, 6, 15.5))[0], mode=Mode.SUBTRACT)

    # Sketch26 → Boss-Extrude5 (add)
    with BuildSketch(Plane(origin=(0, 10, 0), x_dir=(1, 0, 0), z_dir=(0, 1, 0))):
        with Locations((-95, 0)):
            Rectangle(SKETCH26_W, SKETCH26_H)
    extrude(amount=-BOSS_EXTRUDE5_DEPTH)

    # Sketch19 → Boss-Extrude4 (add)
    with BuildSketch(Plane(origin=(0, 10, 0), x_dir=(1, 0, 0), z_dir=(0, 1, 0))):
        with Locations((-91.758295056, 0)):
            Rectangle(SKETCH19_W, SKETCH19_H)
    extrude(amount=-BOSS_EXTRUDE4_DEPTH)

    # Sketch23 → Cut-Extrude18 (cut)
    with BuildSketch(Plane.XZ):
        with Locations((-65.75, 0.01129447)):
            Rectangle(SKETCH23_W, SKETCH23_H)
    extrude(amount=-CUT_EXTRUDE18_DEPTH, mode=Mode.SUBTRACT)

    # Fillet3
    fillet3_edges = [part.edges().sort_by_distance(p)[0] for p in [
        (-115, 5, 26.5),
        (-115, 5, -26.5),
    ]]
    fillet(fillet3_edges, radius=FILLET3_R)

    # Sketch27 → Cut-Extrude20 (cut)
    with BuildSketch(Plane(origin=(0, 10, 0), x_dir=(1, 0, 0), z_dir=(0, 1, 0))):
        with Locations((25, -20.5)):
            Circle(SKETCH27_R)
        with Locations((-5, -20.5)):
            Circle(SKETCH27_R)
        with Locations((75, 0)):
            Circle(SKETCH27_R_2)
    cut_extrude20 = extrude(amount=-CUT_EXTRUDE20_DEPTH, mode=Mode.SUBTRACT)

    # Sketch29 → Cut-Extrude22 (cut, up to next)
    with BuildSketch(Plane.XZ, mode=Mode.PRIVATE) as cut_extrude22_sk1:
        with Locations((-109, -15)):
            Circle(SKETCH29_R)
    cut_extrude22_tool1 = extrude(cut_extrude22_sk1.sketch, amount=-CUT_EXTRUDE22_REACH, mode=Mode.PRIVATE) & part.part
    # Sketch29 → Cut-Extrude22 (cut, up to next)
    with BuildSketch(Plane.XZ, mode=Mode.PRIVATE) as cut_extrude22_sk2:
        with Locations((-109, 15)):
            Circle(SKETCH29_R)
    cut_extrude22_tool2 = extrude(cut_extrude22_sk2.sketch, amount=-CUT_EXTRUDE22_REACH, mode=Mode.PRIVATE) & part.part
    add(cut_extrude22_tool1.solids().sort_by_distance((-109, 0, -15))[0], mode=Mode.SUBTRACT)
    add(cut_extrude22_tool2.solids().sort_by_distance((-109, 0, 15))[0], mode=Mode.SUBTRACT)

    # Mirror2: Cut-Extrude20 across plane
    add(cut_extrude20.mirror(Plane.XY), mode=Mode.SUBTRACT)

    # Sketch30 → Cut-Extrude23 (cut, up to next)
    with BuildSketch(Plane.XZ, mode=Mode.PRIVATE) as cut_extrude23_sk1:
        with Locations((24.664028051, 1.845213245)):
            Circle(SKETCH30_R)
    cut_extrude23_tool1 = extrude(cut_extrude23_sk1.sketch, amount=-CUT_EXTRUDE23_REACH, mode=Mode.PRIVATE) & part.part
    # Sketch30 → Cut-Extrude23 (cut, up to next)
    with BuildSketch(Plane.XZ, mode=Mode.PRIVATE) as cut_extrude23_sk2:
        with Locations((33.61486353, -1.337952512)):
            Circle(SKETCH30_R)
    cut_extrude23_tool2 = extrude(cut_extrude23_sk2.sketch, amount=-CUT_EXTRUDE23_REACH, mode=Mode.PRIVATE) & part.part
    add(cut_extrude23_tool1.solids().sort_by_distance((24.664028, 0, 1.845213))[0], mode=Mode.SUBTRACT)
    add(cut_extrude23_tool2.solids().sort_by_distance((33.614864, 0, -1.337953))[0], mode=Mode.SUBTRACT)


solid = part.part
